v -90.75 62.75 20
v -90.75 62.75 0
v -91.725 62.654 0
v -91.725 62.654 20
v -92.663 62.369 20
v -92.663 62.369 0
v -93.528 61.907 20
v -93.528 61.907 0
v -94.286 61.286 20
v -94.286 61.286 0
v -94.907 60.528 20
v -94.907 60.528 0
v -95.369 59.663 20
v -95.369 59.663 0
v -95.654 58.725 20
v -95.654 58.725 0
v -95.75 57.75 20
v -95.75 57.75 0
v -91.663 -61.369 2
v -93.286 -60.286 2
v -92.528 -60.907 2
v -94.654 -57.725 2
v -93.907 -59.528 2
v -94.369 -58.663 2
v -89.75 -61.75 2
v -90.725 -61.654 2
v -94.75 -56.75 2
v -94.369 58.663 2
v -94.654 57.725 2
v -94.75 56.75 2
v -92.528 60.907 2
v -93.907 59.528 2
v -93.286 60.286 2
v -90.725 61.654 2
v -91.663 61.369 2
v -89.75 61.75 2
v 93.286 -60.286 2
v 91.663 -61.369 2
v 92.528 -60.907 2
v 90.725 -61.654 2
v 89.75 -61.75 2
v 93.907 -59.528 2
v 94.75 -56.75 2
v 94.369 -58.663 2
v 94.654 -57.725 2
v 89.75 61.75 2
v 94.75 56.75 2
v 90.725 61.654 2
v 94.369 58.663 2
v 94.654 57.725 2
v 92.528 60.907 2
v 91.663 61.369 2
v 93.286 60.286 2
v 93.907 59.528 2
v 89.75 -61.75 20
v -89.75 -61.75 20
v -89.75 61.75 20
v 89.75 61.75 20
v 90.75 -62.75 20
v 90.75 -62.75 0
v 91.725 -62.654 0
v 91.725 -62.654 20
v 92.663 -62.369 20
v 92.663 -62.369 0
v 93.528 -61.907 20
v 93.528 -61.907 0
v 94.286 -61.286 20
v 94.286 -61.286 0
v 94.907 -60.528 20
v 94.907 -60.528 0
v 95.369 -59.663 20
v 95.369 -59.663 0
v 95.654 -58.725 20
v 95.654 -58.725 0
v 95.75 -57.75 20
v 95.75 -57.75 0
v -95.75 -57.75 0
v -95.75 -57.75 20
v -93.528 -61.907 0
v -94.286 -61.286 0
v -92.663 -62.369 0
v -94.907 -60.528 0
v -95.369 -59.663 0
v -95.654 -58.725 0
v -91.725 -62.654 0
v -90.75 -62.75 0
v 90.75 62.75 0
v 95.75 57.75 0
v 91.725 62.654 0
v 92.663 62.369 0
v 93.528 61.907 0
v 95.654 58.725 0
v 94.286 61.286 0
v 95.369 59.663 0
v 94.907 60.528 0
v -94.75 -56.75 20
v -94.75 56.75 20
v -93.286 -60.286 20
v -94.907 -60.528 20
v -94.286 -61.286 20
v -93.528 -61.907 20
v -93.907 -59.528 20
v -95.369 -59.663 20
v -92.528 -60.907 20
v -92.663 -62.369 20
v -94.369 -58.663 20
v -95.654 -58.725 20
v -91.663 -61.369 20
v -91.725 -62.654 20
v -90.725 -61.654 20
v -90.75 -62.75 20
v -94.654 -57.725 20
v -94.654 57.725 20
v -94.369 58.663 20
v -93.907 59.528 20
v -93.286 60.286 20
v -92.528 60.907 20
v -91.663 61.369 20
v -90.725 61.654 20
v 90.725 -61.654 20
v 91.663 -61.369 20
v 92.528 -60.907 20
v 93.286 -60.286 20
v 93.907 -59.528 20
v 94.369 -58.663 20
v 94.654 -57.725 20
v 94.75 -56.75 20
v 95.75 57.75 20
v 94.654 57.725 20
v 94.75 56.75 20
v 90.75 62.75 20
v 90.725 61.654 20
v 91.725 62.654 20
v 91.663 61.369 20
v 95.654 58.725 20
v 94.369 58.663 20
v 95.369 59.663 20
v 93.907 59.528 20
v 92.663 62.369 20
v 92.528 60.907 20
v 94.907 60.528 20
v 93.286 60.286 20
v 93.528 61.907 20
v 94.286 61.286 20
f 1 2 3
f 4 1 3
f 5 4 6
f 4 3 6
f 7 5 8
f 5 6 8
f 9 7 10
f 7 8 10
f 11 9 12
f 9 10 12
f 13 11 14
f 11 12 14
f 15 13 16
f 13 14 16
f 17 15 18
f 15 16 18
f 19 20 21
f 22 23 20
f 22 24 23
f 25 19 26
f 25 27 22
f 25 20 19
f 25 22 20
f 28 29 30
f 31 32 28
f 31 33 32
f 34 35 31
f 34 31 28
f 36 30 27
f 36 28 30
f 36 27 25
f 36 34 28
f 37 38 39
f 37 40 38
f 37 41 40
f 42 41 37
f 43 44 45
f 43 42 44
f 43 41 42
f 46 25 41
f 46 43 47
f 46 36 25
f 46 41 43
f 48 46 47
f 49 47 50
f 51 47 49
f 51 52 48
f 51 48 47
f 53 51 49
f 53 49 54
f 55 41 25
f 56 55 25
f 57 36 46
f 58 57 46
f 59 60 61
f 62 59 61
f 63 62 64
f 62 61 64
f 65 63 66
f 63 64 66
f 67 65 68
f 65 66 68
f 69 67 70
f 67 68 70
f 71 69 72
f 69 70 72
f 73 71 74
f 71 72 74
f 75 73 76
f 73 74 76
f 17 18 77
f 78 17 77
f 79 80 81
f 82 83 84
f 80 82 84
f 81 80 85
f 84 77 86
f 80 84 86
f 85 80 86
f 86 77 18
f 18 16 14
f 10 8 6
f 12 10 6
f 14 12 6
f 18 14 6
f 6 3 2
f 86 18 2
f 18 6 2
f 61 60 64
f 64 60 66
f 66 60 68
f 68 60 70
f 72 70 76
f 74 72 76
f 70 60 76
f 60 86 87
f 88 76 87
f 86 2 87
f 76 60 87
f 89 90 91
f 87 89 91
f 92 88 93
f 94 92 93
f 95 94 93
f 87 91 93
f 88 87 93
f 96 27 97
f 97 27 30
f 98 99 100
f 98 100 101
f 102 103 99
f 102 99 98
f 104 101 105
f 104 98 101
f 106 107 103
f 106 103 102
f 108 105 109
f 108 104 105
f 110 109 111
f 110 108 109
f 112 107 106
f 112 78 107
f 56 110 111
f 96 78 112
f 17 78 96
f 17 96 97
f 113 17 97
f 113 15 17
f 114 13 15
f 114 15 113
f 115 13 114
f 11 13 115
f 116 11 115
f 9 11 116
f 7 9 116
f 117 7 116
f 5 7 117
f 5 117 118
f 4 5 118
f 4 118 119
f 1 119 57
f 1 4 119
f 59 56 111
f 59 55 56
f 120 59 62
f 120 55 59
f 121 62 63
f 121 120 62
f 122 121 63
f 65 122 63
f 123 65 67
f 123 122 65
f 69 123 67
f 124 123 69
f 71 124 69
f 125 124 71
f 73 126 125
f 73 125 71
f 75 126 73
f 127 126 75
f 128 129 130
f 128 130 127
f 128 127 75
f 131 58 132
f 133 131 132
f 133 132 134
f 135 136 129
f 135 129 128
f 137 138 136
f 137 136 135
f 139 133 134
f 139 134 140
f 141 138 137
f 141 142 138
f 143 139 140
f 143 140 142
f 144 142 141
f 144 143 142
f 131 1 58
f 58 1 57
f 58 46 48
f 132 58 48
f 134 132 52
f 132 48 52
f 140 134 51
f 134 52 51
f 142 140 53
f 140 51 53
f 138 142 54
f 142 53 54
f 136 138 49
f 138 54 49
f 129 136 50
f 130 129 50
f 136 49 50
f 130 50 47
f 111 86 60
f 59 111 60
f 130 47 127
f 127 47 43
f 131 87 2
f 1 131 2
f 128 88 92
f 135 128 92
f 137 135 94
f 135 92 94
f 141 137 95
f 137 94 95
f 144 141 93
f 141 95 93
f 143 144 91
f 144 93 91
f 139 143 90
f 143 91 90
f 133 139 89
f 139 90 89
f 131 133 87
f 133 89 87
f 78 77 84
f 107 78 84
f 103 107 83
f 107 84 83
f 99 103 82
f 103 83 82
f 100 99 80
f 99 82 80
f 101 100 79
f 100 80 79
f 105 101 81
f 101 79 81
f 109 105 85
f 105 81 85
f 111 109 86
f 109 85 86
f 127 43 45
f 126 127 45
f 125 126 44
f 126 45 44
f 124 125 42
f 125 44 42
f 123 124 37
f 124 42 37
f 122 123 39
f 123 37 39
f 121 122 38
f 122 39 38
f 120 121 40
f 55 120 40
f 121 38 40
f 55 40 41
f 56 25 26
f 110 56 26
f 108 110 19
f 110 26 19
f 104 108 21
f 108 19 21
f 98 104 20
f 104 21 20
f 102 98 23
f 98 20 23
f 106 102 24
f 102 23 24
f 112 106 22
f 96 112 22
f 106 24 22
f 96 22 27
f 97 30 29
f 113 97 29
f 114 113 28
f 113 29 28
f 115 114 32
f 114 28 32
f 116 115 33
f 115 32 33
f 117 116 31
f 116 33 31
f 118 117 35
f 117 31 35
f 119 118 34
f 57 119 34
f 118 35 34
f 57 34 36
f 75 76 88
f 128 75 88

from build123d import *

# Parameters (mm, degrees)
F1_DEPTH = 20
F3_DEPTH = 2


with BuildPart() as f1:
    # F0 (on Top) → F1 (new body)
    with BuildSketch(Plane.XY):
        with BuildLine():
            ThreePointArc((95.75, 57.75), (94.285534, 61.285534), (90.75, 62.75))
            Line((90.75, 62.75), (-90.75, 62.75))
            ThreePointArc((-90.75, 62.75), (-94.285534, 61.285534), (-95.75, 57.75))
            Line((-95.75, 57.75), (-95.75, -57.75))
            ThreePointArc((-95.75, -57.75), (-94.285534, -61.285534), (-90.75, -62.75))
            Line((-90.75, -62.75), (90.75, -62.75))
            ThreePointArc((90.75, -62.75), (94.285534, -61.285534), (95.75, -57.75))
            Line((95.75, -57.75), (95.75, 57.75))
        make_face()
        with BuildLine():
            Line((-89.75, 61.75), (89.75, 61.75))
            ThreePointArc((89.75, 61.75), (93.285534, 60.285534), (94.75, 56.75))
            Line((94.75, 56.75), (94.75, -56.75))
            ThreePointArc((94.75, -56.75), (93.285534, -60.285534), (89.75, -61.75))
            Line((89.75, -61.75), (-89.75, -61.75))
            ThreePointArc((-89.75, -61.75), (-93.285534, -60.285534), (-94.75, -56.75))
            Line((-94.75, -56.75), (-94.75, 56.75))
            ThreePointArc((-94.75, 56.75), (-93.285534, 60.285534), (-89.75, 61.75))
        make_face(mode=Mode.SUBTRACT)
    extrude(amount=F1_DEPTH)

    # F2 (on Top) → F3 (join)
    with BuildSketch(Plane.XY):
        with BuildLine():
            ThreePointArc((95.75, 57.75), (94.285534, 61.285534), (90.75, 62.75))
            Line((90.75, 62.75), (-90.75, 62.75))
            ThreePointArc((-90.75, 62.75), (-94.285534, 61.285534), (-95.75, 57.75))
            Line((-95.75, 57.75), (-95.75, -57.75))
            ThreePointArc((-95.75, -57.75), (-94.285534, -61.285534), (-90.75, -62.75))
            Line((-90.75, -62.75), (90.75, -62.75))
            ThreePointArc((90.75, -62.75), (94.285534, -61.285534), (95.75, -57.75))
            Line((95.75, -57.75), (95.75, 57.75))
        make_face()
    extrude(amount=F3_DEPTH)


solid = f1.part
